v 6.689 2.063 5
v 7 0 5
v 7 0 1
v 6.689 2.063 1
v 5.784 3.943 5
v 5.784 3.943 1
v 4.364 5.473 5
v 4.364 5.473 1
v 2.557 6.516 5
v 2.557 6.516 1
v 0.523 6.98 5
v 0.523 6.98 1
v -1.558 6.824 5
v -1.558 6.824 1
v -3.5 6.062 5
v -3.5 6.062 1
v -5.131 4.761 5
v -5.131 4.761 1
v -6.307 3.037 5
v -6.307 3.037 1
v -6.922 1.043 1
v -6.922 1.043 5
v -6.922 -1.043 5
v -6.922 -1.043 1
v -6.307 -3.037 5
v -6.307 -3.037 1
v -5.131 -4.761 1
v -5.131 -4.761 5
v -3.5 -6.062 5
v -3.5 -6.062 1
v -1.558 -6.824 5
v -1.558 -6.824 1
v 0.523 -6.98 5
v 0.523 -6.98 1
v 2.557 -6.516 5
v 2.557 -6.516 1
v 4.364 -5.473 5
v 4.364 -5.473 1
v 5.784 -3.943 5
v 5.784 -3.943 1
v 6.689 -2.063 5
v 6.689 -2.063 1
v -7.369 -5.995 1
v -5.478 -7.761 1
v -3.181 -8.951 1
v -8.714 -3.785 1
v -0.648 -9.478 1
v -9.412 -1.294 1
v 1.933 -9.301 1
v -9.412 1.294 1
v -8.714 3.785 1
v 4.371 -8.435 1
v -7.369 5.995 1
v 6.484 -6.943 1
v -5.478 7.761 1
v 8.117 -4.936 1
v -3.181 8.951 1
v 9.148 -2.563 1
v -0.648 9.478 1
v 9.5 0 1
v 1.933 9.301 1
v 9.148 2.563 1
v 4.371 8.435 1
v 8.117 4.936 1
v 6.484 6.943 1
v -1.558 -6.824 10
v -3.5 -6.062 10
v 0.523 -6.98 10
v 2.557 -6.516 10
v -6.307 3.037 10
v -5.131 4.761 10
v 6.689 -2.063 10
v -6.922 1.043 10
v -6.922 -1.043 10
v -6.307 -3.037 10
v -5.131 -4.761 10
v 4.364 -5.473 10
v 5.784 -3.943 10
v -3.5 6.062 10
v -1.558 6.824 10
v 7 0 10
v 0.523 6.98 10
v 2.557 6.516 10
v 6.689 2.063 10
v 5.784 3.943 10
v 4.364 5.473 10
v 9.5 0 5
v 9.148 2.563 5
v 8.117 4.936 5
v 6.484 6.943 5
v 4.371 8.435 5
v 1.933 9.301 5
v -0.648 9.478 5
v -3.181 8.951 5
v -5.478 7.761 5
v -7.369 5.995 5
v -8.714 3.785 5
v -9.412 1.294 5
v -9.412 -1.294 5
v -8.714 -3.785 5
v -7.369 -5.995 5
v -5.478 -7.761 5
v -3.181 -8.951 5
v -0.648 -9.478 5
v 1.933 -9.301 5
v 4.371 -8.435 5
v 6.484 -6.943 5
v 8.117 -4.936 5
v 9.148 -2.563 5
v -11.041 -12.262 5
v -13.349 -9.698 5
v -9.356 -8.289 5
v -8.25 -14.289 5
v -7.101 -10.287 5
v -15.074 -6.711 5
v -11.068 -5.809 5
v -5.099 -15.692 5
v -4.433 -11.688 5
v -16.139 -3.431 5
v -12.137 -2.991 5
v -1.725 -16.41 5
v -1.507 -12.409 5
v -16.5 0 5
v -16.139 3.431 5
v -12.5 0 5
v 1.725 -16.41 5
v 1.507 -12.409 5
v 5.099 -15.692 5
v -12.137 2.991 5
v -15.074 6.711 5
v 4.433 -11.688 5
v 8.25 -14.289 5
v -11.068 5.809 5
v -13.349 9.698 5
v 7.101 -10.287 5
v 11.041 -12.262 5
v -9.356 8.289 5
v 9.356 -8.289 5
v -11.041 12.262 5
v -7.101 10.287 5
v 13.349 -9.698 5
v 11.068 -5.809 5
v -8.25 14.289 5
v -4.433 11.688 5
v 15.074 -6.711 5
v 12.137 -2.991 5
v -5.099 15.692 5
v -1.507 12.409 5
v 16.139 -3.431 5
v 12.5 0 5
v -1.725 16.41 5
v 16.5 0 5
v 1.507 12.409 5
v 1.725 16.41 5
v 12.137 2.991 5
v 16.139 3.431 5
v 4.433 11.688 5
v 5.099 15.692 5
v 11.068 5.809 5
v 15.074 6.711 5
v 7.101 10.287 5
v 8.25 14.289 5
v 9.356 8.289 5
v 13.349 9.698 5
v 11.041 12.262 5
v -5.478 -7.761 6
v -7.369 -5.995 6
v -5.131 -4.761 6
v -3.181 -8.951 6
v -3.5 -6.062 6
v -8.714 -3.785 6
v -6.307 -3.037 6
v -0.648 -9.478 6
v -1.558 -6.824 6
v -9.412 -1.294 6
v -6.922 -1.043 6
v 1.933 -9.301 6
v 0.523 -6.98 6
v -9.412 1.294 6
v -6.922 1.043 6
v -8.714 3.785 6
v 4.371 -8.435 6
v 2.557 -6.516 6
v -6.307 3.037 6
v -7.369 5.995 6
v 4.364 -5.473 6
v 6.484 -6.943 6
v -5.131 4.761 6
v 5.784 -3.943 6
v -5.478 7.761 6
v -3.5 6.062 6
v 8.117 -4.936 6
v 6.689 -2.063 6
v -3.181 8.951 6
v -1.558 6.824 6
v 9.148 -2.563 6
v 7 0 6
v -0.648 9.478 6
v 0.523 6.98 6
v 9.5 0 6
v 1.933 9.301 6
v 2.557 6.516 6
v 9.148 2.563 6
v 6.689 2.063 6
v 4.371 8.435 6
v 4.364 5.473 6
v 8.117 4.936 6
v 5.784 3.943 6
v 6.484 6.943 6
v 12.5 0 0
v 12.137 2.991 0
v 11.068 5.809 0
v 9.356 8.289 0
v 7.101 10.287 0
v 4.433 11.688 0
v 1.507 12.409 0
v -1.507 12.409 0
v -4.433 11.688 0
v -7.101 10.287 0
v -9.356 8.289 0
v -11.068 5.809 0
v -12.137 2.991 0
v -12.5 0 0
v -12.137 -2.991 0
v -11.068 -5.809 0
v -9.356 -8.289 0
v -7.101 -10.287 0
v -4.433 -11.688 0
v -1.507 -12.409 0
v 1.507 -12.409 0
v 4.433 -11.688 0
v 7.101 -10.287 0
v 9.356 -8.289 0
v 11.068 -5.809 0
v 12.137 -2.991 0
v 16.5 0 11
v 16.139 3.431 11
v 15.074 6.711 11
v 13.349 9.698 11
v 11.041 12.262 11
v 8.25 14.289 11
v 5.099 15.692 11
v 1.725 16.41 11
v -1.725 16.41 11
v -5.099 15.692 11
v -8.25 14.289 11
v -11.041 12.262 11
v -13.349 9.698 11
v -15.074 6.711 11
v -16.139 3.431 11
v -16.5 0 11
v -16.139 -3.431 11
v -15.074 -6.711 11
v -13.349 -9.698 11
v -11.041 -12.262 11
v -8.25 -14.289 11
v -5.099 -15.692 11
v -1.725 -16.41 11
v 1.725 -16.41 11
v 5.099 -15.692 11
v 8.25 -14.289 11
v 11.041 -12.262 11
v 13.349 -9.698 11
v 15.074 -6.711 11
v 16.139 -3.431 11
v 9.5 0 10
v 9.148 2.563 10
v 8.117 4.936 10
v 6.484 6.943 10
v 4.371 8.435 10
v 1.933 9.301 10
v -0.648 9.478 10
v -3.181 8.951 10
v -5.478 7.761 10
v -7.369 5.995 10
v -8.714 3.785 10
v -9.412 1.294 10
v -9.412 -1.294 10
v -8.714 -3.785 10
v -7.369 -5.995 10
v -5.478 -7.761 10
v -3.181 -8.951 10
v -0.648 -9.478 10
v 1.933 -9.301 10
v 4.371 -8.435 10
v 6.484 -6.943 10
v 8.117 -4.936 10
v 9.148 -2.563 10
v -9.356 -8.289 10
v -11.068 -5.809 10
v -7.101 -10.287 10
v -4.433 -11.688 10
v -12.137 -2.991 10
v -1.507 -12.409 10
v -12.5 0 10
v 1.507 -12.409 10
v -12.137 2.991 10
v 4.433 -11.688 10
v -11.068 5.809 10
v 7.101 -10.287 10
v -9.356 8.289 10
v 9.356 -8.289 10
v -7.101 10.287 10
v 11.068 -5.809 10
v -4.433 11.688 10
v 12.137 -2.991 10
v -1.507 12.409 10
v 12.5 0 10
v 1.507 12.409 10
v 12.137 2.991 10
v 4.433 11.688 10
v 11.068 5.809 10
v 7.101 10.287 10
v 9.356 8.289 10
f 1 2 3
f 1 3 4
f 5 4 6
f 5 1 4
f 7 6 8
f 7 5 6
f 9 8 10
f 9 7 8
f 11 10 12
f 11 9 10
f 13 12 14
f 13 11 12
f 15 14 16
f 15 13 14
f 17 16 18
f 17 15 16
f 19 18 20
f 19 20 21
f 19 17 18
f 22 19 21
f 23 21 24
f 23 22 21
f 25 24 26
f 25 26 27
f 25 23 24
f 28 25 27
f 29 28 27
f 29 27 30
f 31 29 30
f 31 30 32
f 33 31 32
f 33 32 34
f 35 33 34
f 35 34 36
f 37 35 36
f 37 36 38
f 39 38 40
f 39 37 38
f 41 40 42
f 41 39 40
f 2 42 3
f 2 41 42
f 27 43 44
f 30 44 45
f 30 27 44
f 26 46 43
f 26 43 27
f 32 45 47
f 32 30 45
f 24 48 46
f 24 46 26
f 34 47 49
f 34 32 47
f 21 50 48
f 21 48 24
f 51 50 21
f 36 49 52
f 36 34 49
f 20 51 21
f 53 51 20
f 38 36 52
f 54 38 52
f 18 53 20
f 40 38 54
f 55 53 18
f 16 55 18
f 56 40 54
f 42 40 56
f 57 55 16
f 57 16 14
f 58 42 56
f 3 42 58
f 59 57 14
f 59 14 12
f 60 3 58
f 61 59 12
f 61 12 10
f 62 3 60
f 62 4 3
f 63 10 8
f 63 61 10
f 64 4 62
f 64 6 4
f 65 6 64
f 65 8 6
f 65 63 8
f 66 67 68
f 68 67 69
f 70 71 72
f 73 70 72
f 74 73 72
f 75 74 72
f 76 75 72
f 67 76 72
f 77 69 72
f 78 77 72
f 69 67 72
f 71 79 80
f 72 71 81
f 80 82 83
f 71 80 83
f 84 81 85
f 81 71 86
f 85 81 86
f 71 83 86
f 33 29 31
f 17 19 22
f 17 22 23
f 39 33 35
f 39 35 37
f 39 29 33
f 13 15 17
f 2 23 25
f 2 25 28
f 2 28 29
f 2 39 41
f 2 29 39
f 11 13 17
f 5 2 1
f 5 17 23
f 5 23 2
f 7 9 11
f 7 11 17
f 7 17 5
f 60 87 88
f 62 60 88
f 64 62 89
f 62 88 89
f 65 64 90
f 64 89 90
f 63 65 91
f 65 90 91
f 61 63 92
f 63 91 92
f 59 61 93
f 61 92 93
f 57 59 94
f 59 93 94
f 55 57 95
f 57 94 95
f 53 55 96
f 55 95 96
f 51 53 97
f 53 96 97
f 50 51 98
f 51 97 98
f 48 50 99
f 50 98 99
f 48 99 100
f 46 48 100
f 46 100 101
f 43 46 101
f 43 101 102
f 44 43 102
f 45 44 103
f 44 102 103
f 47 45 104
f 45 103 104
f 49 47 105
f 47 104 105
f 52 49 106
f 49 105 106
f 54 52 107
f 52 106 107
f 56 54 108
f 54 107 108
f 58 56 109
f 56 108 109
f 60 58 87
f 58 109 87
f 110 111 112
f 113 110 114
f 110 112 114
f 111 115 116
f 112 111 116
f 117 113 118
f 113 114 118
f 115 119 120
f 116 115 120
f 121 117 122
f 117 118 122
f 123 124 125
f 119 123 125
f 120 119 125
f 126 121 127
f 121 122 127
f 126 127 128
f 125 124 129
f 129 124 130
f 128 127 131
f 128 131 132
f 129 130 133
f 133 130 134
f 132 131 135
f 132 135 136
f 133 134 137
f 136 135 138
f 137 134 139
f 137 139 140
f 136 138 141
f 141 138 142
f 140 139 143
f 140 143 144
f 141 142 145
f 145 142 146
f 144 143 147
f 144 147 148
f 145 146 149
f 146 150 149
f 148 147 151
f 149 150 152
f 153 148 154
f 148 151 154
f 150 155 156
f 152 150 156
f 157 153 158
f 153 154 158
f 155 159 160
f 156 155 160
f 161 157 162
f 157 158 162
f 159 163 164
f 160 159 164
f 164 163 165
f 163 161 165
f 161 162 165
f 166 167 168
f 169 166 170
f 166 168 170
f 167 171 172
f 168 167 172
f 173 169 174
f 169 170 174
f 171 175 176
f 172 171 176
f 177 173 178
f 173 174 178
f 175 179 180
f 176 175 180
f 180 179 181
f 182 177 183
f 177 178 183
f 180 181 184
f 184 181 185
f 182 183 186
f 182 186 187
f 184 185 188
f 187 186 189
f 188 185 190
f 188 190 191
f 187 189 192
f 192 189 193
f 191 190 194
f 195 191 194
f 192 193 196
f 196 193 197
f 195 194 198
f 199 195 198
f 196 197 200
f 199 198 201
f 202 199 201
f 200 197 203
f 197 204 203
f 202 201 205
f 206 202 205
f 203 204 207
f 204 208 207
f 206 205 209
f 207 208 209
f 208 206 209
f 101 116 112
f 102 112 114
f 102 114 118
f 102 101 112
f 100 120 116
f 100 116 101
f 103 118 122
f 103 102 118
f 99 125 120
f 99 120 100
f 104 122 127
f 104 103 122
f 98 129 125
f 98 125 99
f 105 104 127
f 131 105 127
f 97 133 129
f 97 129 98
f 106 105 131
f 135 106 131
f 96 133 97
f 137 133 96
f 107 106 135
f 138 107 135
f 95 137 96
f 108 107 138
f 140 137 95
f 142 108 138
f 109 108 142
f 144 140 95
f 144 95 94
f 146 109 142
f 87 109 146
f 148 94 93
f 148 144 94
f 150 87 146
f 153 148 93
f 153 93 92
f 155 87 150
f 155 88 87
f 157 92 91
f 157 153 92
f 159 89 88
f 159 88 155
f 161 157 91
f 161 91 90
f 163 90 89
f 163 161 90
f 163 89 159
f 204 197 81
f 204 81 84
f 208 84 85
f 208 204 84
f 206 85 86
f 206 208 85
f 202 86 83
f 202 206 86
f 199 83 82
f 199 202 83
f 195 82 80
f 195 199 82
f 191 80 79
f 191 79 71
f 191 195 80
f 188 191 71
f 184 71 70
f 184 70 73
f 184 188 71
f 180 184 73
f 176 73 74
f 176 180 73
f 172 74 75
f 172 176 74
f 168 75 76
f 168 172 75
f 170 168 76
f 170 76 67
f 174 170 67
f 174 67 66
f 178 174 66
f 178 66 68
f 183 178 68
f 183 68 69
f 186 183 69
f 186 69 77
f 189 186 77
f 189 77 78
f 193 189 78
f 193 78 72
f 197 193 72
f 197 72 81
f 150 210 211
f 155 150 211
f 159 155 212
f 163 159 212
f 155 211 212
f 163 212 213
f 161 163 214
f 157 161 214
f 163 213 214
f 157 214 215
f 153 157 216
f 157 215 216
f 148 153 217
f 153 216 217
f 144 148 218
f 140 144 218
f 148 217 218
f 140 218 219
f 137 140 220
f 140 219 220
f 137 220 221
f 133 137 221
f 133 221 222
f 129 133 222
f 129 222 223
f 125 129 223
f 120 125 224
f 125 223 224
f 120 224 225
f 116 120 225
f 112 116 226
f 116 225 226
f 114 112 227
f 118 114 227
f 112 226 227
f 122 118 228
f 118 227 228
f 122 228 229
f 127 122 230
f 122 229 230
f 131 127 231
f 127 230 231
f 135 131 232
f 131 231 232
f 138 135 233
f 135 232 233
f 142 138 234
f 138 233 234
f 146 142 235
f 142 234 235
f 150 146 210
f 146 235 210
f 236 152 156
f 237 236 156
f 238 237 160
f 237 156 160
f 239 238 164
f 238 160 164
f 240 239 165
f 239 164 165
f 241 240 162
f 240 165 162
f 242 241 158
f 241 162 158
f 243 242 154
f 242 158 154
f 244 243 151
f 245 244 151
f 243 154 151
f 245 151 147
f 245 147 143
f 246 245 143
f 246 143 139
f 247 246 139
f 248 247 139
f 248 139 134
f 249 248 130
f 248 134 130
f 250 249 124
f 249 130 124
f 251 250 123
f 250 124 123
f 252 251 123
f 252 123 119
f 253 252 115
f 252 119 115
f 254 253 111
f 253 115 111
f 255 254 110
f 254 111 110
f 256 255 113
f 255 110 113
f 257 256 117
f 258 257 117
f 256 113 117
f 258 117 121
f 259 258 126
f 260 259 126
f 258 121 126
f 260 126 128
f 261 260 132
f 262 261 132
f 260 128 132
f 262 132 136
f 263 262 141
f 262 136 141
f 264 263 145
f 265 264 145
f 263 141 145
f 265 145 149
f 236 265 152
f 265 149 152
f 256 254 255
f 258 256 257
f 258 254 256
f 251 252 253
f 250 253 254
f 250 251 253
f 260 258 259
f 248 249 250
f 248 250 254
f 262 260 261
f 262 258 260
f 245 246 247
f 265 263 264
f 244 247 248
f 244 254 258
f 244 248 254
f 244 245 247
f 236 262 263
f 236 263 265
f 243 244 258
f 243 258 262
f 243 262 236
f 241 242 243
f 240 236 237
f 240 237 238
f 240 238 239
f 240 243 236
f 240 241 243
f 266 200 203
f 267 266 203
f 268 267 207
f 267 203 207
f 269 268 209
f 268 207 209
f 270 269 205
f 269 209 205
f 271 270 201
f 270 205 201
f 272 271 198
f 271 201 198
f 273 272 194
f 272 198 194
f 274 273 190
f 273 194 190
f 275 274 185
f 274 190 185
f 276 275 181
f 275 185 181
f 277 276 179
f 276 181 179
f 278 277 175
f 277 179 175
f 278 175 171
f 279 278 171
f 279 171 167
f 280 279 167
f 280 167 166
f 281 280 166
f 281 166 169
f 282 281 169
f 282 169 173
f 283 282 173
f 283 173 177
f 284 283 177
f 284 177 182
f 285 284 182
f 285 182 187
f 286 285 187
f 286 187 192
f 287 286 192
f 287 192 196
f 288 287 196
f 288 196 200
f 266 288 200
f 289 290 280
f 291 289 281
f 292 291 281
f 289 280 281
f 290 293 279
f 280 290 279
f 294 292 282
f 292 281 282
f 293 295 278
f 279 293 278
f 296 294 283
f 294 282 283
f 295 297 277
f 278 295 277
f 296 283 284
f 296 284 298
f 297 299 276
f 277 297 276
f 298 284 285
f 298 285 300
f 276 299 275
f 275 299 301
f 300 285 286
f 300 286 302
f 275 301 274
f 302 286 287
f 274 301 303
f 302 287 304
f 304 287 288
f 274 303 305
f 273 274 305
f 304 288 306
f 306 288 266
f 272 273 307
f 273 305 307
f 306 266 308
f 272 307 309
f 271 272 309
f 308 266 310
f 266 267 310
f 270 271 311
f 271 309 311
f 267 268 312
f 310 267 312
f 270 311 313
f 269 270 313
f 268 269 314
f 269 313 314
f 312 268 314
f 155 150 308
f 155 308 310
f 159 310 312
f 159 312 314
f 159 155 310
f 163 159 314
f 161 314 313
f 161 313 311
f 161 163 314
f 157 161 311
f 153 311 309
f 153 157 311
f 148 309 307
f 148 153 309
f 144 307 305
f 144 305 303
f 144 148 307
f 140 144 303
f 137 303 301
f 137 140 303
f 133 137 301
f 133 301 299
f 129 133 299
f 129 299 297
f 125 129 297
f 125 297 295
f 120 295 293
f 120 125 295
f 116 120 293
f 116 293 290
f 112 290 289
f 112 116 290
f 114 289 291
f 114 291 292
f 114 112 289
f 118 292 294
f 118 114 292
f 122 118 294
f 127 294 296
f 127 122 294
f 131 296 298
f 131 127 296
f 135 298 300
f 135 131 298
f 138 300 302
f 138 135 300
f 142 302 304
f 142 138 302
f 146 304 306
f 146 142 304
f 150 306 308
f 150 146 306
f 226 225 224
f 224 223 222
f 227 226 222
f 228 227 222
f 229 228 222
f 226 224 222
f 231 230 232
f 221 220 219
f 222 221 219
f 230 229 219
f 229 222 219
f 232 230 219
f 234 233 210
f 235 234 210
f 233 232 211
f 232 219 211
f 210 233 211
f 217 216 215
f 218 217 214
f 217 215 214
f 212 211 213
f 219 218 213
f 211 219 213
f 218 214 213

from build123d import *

# Parameters (mm, degrees)
F0_R     = 12.5
F1_DEPTH = 5
F2_R     = 9.5
F2_R_2   = 7
F3_DEPTH = 4
F4_R     = 16.5
F4_R_2   = 12.5
F4_R_3   = 9.5
F4_R_4   = 7
F5_DEPTH = 6
F6_DEPTH = 5
F7_R     = 9.5
F8_DEPTH = 1


with BuildPart() as f1:
    # F0 (on Top) → F1 (new body)
    with BuildSketch(Plane.XY):
        Circle(F0_R)
    extrude(amount=F1_DEPTH)

    # F2 (on face) → F3 (cut)
    with BuildSketch(Plane.XY.offset(5)):
        Circle(F2_R)
        Circle(F2_R_2, mode=Mode.SUBTRACT)
    extrude(amount=-F3_DEPTH, mode=Mode.SUBTRACT)


with BuildPart() as f5:
    # F4 (on face) → F5 (new body)
    with BuildSketch(Plane.XY.offset(5)):
        Circle(F4_R)
        Circle(F4_R_2, mode=Mode.SUBTRACT)
        Circle(F4_R_2)
        Circle(F4_R_3, mode=Mode.SUBTRACT)
        Circle(F4_R_3)
        Circle(F4_R_4, mode=Mode.SUBTRACT)
        Circle(F4_R_4)
    extrude(amount=F5_DEPTH)

    # F4 (on face) → F6 (cut)
    with BuildSketch(Plane.XY.offset(5)):
        Circle(F4_R_2)
        Circle(F4_R_3, mode=Mode.SUBTRACT)
        Circle(F4_R_4)
    extrude(amount=F6_DEPTH, mode=Mode.SUBTRACT)

    # F7 (on face) → F8 (cut)
    with BuildSketch(Plane.XY.offset(5)):
        Circle(F7_R)
    extrude(amount=F8_DEPTH, mode=Mode.SUBTRACT)


solid = Compound([f1.part, f5.part])
